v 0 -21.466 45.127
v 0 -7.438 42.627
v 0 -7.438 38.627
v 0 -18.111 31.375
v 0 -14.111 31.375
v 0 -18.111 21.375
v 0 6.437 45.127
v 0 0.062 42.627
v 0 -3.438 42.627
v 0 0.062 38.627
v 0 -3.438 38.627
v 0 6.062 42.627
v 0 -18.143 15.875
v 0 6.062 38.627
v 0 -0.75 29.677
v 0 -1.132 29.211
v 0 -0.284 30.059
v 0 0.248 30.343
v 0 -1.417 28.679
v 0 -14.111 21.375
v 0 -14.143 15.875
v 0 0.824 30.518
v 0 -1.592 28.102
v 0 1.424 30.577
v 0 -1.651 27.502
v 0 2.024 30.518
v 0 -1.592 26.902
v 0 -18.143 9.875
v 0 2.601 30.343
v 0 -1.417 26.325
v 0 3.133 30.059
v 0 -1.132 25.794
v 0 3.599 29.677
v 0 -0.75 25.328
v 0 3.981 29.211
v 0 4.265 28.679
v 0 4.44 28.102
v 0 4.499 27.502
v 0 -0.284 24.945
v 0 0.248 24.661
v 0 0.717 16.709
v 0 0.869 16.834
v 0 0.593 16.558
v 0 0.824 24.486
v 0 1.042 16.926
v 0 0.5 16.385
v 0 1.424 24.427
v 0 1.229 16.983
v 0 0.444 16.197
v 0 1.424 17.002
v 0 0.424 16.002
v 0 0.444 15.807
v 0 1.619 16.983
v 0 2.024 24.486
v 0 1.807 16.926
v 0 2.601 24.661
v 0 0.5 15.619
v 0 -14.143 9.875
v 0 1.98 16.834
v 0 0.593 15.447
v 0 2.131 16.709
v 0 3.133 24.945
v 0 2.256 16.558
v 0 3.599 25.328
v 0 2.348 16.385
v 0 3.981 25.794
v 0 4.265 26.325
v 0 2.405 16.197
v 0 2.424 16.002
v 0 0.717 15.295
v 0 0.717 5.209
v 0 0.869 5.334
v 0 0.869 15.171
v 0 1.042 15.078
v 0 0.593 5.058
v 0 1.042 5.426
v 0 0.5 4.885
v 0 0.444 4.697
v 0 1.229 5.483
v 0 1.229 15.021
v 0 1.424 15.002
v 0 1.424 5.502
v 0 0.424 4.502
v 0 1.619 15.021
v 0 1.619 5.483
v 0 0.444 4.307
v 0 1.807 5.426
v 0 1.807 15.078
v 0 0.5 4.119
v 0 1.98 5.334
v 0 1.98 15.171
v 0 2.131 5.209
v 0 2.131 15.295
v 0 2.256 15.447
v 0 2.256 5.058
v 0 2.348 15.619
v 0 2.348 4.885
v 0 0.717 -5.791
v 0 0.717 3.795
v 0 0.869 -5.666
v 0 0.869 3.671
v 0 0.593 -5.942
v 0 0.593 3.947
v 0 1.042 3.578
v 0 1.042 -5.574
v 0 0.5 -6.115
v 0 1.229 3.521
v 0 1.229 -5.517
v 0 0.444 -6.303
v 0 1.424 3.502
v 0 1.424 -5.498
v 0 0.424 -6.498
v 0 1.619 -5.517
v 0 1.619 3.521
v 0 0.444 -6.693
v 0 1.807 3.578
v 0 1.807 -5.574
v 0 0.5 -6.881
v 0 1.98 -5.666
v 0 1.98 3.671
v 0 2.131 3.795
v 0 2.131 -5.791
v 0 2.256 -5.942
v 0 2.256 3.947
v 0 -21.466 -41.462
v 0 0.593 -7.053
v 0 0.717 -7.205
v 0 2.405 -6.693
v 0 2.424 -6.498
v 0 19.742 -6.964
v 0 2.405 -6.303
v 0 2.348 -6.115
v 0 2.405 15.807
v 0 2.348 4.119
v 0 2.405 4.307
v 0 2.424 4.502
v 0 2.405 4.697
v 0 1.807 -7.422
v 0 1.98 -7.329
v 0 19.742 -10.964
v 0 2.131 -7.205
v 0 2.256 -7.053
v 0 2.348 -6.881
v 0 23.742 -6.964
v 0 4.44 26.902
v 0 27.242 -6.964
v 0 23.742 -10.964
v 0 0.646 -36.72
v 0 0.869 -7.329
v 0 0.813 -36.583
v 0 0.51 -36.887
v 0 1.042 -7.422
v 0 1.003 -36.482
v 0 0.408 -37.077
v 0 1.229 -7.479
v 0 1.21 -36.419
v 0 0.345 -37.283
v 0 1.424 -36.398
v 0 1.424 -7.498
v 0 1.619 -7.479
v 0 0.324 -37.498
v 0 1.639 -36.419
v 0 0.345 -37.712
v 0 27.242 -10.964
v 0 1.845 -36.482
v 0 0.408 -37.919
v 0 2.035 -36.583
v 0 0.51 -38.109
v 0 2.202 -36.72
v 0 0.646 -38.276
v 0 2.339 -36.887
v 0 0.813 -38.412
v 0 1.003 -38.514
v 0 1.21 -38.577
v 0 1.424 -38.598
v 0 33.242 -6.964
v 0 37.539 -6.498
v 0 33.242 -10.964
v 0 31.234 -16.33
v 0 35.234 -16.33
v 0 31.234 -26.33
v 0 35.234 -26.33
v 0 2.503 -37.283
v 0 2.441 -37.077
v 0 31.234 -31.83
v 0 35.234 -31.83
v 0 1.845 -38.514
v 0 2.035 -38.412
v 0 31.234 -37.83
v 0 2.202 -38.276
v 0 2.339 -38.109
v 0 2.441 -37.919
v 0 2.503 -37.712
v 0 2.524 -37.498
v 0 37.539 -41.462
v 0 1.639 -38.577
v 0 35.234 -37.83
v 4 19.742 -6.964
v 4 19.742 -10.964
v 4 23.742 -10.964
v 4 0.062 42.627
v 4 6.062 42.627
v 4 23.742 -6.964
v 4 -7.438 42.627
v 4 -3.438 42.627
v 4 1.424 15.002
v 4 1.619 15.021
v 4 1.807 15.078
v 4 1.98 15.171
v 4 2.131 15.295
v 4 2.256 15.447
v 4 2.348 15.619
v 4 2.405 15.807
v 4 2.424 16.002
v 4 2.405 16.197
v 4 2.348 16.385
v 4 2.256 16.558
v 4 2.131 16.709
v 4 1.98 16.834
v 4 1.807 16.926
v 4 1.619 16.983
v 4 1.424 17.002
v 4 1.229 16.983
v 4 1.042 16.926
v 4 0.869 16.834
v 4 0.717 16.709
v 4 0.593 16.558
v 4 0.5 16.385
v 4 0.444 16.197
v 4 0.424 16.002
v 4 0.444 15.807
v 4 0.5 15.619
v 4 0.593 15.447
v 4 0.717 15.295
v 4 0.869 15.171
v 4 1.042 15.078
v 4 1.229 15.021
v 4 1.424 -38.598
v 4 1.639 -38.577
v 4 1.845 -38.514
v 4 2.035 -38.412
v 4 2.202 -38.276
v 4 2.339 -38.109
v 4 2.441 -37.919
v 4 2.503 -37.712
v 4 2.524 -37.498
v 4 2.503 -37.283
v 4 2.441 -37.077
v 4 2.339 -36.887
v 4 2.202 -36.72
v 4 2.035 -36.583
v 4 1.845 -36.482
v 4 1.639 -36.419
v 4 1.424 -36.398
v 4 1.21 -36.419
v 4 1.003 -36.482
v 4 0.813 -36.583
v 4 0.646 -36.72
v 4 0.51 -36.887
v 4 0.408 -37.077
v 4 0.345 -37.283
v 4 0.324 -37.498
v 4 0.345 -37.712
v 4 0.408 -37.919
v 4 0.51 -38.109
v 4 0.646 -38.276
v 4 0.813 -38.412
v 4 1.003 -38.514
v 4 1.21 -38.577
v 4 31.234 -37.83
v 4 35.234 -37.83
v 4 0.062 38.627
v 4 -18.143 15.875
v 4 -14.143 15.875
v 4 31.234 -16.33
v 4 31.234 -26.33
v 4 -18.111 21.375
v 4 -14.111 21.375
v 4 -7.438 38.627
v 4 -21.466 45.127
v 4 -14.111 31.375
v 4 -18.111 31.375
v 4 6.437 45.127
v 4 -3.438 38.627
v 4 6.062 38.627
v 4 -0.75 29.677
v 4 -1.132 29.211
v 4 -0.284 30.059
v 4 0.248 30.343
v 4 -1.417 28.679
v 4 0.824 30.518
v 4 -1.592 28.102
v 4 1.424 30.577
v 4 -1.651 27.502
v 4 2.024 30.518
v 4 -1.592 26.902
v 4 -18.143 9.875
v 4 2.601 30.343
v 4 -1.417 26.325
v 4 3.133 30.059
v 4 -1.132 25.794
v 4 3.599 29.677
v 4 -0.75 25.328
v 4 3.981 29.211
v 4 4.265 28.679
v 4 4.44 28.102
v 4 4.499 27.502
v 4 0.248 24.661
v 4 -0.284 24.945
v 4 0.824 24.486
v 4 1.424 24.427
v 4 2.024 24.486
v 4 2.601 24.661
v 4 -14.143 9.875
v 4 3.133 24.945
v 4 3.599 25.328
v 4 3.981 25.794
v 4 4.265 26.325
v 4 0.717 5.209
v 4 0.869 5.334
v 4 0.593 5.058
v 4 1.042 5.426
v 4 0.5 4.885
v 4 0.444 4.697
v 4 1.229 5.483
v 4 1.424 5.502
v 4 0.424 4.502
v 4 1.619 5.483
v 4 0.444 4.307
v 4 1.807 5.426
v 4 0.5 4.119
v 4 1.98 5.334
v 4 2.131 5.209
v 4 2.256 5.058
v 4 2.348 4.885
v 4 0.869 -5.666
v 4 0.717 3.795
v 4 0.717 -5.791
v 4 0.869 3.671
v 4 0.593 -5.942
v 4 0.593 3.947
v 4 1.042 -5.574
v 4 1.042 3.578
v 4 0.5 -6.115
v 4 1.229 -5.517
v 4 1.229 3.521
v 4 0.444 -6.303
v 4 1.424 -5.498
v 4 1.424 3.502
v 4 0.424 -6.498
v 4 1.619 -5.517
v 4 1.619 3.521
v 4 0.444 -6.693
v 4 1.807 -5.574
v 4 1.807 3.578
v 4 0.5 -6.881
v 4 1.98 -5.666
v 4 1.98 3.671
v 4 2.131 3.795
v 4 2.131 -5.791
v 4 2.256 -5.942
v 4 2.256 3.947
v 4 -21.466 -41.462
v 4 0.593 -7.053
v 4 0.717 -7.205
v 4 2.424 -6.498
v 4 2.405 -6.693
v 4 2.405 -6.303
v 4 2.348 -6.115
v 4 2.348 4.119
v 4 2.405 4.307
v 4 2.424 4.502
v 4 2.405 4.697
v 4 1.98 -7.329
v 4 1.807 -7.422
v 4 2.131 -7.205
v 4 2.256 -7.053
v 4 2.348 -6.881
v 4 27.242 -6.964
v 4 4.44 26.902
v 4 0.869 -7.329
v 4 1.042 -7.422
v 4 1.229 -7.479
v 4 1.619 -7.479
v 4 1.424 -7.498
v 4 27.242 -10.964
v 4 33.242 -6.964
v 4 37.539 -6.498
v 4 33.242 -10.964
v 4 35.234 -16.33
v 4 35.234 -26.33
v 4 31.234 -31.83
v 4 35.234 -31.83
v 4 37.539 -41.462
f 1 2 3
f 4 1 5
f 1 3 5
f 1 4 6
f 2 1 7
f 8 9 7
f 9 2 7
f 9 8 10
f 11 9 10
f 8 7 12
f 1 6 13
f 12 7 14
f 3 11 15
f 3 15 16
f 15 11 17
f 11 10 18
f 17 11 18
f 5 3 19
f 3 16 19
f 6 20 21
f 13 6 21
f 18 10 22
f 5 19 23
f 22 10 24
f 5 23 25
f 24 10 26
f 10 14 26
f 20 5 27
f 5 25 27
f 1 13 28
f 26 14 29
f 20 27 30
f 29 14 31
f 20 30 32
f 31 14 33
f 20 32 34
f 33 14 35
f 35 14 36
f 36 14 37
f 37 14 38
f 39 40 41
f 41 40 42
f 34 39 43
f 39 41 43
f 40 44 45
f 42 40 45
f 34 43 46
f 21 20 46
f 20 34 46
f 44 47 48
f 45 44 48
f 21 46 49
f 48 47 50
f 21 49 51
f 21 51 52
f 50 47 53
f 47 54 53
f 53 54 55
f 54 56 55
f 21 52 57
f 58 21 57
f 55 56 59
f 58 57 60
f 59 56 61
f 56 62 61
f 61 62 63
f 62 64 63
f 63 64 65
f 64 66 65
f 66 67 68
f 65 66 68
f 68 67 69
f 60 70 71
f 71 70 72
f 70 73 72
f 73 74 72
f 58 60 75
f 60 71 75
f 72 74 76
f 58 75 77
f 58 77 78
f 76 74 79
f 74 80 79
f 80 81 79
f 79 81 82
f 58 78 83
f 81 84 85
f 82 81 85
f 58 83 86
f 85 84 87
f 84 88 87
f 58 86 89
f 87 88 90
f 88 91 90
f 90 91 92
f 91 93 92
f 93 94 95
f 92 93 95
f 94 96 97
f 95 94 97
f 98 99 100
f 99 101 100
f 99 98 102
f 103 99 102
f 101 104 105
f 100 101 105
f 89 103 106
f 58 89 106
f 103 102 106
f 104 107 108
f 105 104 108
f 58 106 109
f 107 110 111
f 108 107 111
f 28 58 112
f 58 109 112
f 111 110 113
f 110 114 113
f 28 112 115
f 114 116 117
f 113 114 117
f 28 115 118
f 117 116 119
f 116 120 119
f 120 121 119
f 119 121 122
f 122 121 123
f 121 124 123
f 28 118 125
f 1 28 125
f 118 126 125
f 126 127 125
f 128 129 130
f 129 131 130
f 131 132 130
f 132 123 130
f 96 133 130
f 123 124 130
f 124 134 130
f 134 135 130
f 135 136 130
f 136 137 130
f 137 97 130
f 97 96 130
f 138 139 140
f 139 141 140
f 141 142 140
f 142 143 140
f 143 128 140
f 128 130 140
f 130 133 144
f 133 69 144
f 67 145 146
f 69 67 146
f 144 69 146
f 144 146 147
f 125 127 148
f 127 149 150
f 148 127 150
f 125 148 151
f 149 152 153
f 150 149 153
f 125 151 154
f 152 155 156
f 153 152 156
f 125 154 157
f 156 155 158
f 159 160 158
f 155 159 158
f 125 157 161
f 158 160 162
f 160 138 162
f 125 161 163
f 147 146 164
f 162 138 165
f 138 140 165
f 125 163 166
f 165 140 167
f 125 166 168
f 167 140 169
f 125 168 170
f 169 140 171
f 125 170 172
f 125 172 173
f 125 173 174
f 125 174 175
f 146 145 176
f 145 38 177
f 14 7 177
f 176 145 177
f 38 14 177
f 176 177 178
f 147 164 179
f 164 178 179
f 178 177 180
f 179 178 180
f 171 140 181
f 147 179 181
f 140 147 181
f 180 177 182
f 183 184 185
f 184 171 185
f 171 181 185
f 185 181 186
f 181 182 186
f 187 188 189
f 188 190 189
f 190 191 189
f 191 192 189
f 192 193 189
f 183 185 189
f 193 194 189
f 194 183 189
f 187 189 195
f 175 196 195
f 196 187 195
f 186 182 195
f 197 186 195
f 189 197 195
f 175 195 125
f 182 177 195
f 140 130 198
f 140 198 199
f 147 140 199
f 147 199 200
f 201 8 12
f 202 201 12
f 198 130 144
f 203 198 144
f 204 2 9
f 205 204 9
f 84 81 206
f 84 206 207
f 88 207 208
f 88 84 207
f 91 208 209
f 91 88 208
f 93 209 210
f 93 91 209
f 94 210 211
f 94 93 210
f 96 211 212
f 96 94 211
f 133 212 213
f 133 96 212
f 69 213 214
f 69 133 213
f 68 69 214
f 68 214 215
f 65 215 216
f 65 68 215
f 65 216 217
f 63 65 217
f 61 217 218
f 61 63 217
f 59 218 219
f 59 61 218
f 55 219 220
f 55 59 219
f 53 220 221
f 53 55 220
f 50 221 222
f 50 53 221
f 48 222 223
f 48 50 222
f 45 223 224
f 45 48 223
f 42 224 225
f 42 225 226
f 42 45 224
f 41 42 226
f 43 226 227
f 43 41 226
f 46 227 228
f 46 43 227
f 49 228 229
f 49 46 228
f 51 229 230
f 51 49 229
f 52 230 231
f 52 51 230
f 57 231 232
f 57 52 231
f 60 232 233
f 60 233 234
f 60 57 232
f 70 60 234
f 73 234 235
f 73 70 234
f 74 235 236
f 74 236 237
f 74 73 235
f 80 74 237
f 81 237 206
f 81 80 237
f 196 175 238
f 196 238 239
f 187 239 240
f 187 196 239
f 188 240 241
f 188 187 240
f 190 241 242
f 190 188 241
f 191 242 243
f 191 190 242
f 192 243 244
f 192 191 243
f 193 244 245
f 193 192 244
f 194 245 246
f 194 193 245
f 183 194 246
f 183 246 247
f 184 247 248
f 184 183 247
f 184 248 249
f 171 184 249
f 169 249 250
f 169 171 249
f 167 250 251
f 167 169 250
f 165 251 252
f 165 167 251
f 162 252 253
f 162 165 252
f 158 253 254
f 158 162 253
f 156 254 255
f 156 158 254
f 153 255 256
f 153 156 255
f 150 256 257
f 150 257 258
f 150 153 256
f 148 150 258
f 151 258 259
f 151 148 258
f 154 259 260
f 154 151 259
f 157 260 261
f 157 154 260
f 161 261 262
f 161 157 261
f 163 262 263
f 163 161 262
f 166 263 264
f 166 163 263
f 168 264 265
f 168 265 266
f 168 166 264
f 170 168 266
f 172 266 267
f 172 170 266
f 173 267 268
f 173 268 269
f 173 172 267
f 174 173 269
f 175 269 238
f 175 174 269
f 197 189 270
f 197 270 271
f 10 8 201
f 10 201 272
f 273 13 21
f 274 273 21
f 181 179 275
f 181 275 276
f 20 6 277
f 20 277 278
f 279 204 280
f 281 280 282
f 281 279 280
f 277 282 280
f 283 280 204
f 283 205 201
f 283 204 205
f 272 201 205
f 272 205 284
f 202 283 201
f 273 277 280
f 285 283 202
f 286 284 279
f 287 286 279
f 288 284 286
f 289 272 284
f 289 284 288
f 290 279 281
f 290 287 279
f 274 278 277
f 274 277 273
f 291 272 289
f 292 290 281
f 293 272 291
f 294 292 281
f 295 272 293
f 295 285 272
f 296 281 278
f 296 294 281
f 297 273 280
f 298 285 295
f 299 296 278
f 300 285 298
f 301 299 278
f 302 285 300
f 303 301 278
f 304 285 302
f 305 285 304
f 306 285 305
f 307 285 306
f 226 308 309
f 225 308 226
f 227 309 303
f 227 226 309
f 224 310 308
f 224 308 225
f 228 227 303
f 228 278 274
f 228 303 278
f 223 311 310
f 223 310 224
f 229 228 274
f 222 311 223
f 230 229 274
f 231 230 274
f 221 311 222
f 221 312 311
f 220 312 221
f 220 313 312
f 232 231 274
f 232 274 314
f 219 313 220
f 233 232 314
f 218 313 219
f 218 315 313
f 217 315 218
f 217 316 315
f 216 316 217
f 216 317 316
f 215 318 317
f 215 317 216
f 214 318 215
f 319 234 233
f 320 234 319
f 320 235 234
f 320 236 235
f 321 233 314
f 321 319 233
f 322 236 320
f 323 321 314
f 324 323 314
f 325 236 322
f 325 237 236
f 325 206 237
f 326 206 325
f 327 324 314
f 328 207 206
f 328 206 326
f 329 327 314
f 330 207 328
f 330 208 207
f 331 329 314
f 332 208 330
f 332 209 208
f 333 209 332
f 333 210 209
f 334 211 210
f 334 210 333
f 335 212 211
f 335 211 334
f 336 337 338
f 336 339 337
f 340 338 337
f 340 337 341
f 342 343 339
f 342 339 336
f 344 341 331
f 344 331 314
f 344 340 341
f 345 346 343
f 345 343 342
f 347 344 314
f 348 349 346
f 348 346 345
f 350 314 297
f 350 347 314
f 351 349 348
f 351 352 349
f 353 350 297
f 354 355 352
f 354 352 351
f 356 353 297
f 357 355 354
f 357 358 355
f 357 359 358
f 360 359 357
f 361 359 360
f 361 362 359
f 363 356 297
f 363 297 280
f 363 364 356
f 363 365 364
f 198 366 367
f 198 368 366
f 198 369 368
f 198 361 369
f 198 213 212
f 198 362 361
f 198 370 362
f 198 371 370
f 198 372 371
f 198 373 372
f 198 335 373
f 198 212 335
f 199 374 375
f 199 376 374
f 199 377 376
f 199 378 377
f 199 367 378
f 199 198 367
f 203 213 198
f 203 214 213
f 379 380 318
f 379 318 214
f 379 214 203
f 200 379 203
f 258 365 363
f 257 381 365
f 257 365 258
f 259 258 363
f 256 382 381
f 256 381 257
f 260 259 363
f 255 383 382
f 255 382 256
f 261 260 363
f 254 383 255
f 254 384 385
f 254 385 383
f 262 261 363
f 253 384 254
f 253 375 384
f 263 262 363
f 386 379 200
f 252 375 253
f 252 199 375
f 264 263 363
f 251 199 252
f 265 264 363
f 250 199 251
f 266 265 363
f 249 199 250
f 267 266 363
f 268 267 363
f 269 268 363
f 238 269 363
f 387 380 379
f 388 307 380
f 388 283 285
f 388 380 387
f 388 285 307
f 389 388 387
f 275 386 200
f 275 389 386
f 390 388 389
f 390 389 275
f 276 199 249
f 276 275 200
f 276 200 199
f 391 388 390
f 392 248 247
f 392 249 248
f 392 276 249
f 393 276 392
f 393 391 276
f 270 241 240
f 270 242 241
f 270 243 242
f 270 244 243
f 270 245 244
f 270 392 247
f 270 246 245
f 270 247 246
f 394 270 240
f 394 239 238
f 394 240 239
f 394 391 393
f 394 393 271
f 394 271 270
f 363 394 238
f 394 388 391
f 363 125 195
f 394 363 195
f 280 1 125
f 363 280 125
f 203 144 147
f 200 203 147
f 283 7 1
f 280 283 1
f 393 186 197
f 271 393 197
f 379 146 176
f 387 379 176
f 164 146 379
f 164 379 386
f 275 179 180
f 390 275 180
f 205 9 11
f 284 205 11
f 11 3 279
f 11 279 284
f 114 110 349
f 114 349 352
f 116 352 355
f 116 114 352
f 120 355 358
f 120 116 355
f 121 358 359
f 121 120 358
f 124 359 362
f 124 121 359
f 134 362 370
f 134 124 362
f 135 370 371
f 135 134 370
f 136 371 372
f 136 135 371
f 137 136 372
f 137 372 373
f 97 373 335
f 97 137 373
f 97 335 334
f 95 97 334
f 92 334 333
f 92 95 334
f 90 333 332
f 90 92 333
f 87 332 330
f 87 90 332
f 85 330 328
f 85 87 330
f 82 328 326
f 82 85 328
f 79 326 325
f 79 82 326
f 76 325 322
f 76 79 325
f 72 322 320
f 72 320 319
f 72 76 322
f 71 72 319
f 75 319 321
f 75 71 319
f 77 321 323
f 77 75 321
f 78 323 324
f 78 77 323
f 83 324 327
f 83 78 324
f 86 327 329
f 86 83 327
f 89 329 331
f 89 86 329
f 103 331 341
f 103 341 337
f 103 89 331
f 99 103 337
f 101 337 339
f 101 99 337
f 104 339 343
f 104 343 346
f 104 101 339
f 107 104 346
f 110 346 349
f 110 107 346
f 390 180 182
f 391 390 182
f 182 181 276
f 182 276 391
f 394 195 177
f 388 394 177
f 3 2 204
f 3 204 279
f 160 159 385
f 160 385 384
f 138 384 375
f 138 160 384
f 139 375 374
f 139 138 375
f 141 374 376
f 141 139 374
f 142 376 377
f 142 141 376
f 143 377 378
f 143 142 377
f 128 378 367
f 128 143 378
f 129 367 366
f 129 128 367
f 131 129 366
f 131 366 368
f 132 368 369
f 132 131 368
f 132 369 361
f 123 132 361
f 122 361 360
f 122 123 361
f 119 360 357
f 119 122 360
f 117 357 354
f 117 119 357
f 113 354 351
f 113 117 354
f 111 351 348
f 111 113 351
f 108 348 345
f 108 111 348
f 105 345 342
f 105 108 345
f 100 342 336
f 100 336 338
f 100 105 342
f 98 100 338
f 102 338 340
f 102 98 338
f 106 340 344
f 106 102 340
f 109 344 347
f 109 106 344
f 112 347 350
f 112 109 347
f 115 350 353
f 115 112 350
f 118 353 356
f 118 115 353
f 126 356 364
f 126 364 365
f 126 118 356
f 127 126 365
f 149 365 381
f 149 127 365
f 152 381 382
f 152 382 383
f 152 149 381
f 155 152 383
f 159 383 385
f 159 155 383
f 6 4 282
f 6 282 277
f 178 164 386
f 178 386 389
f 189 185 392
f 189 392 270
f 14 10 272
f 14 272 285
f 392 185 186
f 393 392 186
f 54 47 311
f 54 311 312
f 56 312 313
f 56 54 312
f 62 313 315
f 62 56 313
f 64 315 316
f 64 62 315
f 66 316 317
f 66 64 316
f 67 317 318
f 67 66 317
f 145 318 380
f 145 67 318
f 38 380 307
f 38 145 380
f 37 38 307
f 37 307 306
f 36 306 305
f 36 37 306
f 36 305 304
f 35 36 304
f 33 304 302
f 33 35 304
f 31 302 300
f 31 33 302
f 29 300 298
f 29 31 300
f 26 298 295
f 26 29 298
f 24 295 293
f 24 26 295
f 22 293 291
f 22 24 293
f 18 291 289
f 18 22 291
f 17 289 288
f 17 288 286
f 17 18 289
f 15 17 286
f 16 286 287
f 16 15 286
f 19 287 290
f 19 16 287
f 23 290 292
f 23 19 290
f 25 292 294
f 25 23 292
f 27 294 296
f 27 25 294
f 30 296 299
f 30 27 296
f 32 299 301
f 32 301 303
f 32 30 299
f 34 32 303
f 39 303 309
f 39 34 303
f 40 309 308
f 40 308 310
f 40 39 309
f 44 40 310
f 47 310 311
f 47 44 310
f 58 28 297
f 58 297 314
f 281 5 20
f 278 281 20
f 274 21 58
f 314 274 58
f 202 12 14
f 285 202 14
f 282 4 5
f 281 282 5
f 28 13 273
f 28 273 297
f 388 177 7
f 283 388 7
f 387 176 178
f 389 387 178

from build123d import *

# Parameters (mm, degrees)
SKETCH1_R           = 3.075
SKETCH1_R_2         = 1
SKETCH1_R_3         = 1.1
SKETCH1_W           = 10
SKETCH1_H           = 4
SKETCH1_W_2         = 4
SKETCH1_H_2         = 6
SKETCH1_W_3         = 6
BOSS_EXTRUDE1_DEPTH = 4


with BuildPart() as part:
    # Sketch1 → Boss-Extrude1 (new body)
    with BuildSketch(Plane(origin=(0, 0, 0), x_dir=(0, 0, -1), z_dir=(1, 0, 0))):
        Polygon((-45.126561274, -21.465862465), (41.462435166, -21.465862465), (41.462435166, 37.538855), (6.497816801, 37.538855), (-45.126561274, 6.437068625), align=None)
        with Locations((-27.502183199, 1.424311927)):
            Circle(SKETCH1_R, mode=Mode.SUBTRACT)
        with Locations((-16.002183199, 1.424311927)):
            Circle(SKETCH1_R_2, mode=Mode.SUBTRACT)
        with Locations((-4.502183199, 1.424311927)):
            Circle(SKETCH1_R_2, mode=Mode.SUBTRACT)
        with Locations((6.497816801, 1.424311927)):
            Circle(SKETCH1_R_2, mode=Mode.SUBTRACT)
        with Locations((37.497816801, 1.424311927)):
            Circle(SKETCH1_R_3, mode=Mode.SUBTRACT)
        with Locations((21.33035671, 33.233983224)):
            Rectangle(SKETCH1_W, SKETCH1_H, mode=Mode.SUBTRACT)
        with Locations((-40.626561274, 3.062484248)):
            Rectangle(SKETCH1_W_2, SKETCH1_H_2, mode=Mode.SUBTRACT)
        with Locations((-40.626561274, -5.437515752)):
            Rectangle(SKETCH1_W_2, SKETCH1_H, mode=Mode.SUBTRACT)
        with Locations((-26.374737007, -16.111091518)):
            Rectangle(SKETCH1_W, SKETCH1_H, mode=Mode.SUBTRACT)
        with Locations((-12.874826786, -16.142516965)):
            Rectangle(SKETCH1_W_3, SKETCH1_H, mode=Mode.SUBTRACT)
        with Locations((34.83035671, 33.233983224)):
            Rectangle(SKETCH1_W_3, SKETCH1_H, mode=Mode.SUBTRACT)
        with Locations((8.963743124, 30.24228943)):
            Rectangle(SKETCH1_W_2, SKETCH1_H_2, mode=Mode.SUBTRACT)
        with Locations((8.963743124, 21.74228943)):
            Rectangle(SKETCH1_W_2, SKETCH1_H, mode=Mode.SUBTRACT)
    extrude(amount=BOSS_EXTRUDE1_DEPTH)


solid = part.part
